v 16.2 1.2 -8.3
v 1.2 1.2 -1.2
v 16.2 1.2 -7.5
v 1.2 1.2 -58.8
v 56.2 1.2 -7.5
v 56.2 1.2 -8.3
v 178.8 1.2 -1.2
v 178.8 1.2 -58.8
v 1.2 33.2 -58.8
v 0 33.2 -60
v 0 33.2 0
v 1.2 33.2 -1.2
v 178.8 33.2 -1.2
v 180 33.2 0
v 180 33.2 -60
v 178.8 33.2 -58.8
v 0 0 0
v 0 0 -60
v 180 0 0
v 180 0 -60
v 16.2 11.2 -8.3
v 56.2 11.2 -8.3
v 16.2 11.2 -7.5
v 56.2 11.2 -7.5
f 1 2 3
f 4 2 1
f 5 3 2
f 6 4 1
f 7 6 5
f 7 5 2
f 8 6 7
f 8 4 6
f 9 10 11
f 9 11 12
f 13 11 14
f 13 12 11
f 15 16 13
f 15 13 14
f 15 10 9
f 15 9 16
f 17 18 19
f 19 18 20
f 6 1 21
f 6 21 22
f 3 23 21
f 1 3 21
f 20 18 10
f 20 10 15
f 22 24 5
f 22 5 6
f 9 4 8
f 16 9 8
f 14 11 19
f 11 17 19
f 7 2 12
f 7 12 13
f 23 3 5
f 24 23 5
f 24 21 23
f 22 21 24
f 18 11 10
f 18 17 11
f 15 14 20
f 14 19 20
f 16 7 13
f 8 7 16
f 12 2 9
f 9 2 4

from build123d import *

# Parameters (mm, degrees)
SKETCH1_W           = 180
SKETCH1_H           = 60
BOSS_EXTRUDE1_DEPTH = 1.2
SKETCH3_W           = 180
SKETCH3_H           = 60
SKETCH3_W_2         = 177.6
SKETCH3_H_2         = 57.6
BOSS_EXTRUDE2_DEPTH = 32
SKETCH4_W           = 40
SKETCH4_H           = 0.8
BOSS_EXTRUDE3_DEPTH = 10


with BuildPart() as part:
    # Sketch1 → Boss-Extrude1 (new body)
    with BuildSketch(Plane(origin=(0, 0, 0), x_dir=(1, 0, 0), z_dir=(0, 1, 0))):
        with Locations((90, 30)):
            Rectangle(SKETCH1_W, SKETCH1_H)
    extrude(amount=BOSS_EXTRUDE1_DEPTH)

    # Sketch3 → Boss-Extrude2 (add)
    with BuildSketch(Plane(origin=(0, 1.2, 0), x_dir=(1, 0, 0), z_dir=(0, 1, 0))):
        with Locations((90, 30)):
            Rectangle(SKETCH3_W, SKETCH3_H)
        with Locations((90, 30)):
            Rectangle(SKETCH3_W_2, SKETCH3_H_2, mode=Mode.SUBTRACT)
    extrude(amount=BOSS_EXTRUDE2_DEPTH)

    # Sketch4 → Boss-Extrude3 (add)
    with BuildSketch(Plane(origin=(0, 1.2, 0), x_dir=(1, 0, 0), z_dir=(0, 1, 0))):
        with Locations((36.2, 7.9)):
            Rectangle(SKETCH4_W, SKETCH4_H)
    extrude(amount=BOSS_EXTRUDE3_DEPTH)


solid = part.part
